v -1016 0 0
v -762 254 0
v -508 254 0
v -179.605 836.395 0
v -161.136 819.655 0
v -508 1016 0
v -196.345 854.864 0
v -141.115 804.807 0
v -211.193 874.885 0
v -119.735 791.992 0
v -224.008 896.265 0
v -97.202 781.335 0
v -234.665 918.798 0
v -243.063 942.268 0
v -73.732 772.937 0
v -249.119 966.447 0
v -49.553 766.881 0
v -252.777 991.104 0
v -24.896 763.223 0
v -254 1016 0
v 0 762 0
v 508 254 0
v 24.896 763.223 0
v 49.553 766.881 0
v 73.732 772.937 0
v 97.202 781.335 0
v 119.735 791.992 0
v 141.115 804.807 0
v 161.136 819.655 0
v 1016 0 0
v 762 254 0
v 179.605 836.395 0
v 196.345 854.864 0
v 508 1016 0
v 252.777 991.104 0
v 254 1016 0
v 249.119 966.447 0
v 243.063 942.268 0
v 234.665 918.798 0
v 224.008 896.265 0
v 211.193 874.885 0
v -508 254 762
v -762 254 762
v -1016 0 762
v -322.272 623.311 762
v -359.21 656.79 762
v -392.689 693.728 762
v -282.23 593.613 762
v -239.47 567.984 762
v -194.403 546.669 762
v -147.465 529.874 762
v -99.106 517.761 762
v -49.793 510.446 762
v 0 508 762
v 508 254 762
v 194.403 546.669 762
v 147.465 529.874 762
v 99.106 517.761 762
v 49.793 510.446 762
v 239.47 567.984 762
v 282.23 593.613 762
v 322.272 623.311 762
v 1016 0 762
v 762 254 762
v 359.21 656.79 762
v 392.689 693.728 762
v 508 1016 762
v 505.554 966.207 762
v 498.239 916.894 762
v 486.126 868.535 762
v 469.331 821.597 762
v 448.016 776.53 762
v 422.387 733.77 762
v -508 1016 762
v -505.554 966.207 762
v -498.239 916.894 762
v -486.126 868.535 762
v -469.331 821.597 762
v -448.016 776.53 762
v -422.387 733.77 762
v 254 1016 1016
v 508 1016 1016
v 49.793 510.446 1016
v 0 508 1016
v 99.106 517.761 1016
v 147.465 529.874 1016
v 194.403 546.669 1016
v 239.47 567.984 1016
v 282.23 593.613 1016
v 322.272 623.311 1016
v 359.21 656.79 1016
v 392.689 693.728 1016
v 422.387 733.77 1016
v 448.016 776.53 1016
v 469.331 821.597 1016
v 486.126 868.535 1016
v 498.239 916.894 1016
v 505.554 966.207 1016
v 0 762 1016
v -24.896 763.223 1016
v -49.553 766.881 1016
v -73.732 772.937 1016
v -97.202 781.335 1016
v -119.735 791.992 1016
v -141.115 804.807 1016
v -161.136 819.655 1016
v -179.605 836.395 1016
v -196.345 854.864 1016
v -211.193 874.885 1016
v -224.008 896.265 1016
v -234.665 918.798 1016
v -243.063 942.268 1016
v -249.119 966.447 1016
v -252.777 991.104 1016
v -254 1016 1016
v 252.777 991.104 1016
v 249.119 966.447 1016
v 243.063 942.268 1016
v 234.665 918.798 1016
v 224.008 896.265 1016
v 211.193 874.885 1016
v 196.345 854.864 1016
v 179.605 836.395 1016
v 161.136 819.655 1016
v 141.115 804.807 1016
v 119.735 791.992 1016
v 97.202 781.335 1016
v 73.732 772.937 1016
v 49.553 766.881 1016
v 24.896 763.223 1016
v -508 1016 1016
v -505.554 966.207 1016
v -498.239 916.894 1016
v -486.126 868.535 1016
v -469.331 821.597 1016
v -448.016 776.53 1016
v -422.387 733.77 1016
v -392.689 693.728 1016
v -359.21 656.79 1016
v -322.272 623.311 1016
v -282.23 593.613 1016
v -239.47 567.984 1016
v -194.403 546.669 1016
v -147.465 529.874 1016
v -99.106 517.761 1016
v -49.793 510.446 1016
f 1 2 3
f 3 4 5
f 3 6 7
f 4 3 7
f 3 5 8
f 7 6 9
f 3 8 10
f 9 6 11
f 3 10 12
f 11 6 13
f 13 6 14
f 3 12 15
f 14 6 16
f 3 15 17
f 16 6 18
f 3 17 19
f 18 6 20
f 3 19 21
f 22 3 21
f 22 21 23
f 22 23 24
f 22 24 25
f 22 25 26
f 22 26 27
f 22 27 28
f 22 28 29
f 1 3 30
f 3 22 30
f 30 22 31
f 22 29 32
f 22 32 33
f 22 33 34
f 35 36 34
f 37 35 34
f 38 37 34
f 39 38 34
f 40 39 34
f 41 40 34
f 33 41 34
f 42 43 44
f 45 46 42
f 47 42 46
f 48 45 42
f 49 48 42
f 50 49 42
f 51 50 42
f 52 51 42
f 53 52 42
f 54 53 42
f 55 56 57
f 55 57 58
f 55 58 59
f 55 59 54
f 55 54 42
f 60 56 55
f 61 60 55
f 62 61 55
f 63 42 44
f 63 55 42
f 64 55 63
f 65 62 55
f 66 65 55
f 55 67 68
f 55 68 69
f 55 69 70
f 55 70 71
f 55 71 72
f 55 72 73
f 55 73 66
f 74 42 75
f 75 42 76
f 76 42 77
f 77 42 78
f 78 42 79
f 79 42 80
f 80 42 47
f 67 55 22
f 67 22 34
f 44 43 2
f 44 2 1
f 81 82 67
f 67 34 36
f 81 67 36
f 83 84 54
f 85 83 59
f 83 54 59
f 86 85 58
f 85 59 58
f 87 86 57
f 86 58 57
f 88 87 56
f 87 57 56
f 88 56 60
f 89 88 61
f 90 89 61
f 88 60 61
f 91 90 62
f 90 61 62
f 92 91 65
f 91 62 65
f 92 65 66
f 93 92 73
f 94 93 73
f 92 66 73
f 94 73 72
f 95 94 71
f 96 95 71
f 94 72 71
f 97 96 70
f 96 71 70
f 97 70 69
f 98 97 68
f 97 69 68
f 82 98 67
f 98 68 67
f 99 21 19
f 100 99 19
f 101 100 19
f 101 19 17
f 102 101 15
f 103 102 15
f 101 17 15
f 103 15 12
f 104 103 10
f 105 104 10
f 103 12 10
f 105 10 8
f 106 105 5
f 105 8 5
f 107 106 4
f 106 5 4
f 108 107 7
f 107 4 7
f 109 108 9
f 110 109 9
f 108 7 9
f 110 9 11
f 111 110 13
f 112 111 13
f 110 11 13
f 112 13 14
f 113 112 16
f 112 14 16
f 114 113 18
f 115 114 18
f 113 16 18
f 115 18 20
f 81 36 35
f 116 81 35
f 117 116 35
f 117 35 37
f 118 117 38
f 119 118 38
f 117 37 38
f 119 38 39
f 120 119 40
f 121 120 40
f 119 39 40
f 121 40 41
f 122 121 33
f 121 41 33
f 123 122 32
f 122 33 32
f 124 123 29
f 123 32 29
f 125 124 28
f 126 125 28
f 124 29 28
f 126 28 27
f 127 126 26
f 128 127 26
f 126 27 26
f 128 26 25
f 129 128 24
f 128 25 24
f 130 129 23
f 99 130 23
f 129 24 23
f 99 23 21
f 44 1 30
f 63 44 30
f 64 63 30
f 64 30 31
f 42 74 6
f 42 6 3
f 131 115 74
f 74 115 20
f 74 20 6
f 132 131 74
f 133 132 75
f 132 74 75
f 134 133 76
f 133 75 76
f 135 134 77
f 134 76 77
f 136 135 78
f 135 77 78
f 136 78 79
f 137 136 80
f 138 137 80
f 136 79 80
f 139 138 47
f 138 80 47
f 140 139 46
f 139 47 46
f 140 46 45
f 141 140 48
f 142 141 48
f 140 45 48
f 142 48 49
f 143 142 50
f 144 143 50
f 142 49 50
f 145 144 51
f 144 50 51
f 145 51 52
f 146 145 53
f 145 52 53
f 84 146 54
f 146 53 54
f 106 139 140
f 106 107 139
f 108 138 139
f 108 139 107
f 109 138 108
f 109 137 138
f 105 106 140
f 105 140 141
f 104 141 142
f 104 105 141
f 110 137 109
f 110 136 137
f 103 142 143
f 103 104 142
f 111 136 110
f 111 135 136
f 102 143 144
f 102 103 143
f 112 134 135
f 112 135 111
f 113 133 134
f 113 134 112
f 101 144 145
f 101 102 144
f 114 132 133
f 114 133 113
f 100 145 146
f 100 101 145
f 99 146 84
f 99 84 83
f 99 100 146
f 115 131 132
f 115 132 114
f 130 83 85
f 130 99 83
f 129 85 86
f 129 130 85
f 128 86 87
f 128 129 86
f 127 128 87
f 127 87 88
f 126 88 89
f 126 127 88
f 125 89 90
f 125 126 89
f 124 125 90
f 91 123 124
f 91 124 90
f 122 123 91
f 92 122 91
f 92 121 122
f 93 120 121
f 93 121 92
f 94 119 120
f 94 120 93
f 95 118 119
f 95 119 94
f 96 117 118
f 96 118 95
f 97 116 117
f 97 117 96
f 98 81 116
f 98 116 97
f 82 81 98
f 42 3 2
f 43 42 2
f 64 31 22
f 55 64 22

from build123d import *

# Parameters (mm, degrees)
BOSS_EXTRUDE1_DEPTH = 1016
BOSS_EXTRUDE2_DEPTH = 762


with BuildPart() as part:
    # Sketch1 → Boss-Extrude1 (new body)
    with BuildSketch(Plane.XY):
        with BuildLine():
            ThreePointArc((-508, 1016), (0, 508), (508, 1016))
            Line((508, 1016), (254, 1016))
            ThreePointArc((254, 1016), (0, 762), (-254, 1016))
            Line((-254, 1016), (-508, 1016))
        make_face()
    extrude(amount=BOSS_EXTRUDE1_DEPTH)

    # Sketch1<3> → Boss-Extrude2 (add)
    with BuildSketch(Plane.XY):
        with BuildLine():
            Line((-1016, 0), (1016, 0))
            Line((1016, 0), (762, 254))
            Line((762, 254), (508, 254))
            Line((508, 254), (508, 1016))
            ThreePointArc((508, 1016), (0, 508), (-508, 1016))
            Line((-508, 1016), (-508, 254))
            Line((-508, 254), (-762, 254))
            Line((-762, 254), (-1016, 0))
        make_face()
    extrude(amount=BOSS_EXTRUDE2_DEPTH)


solid = part.part
